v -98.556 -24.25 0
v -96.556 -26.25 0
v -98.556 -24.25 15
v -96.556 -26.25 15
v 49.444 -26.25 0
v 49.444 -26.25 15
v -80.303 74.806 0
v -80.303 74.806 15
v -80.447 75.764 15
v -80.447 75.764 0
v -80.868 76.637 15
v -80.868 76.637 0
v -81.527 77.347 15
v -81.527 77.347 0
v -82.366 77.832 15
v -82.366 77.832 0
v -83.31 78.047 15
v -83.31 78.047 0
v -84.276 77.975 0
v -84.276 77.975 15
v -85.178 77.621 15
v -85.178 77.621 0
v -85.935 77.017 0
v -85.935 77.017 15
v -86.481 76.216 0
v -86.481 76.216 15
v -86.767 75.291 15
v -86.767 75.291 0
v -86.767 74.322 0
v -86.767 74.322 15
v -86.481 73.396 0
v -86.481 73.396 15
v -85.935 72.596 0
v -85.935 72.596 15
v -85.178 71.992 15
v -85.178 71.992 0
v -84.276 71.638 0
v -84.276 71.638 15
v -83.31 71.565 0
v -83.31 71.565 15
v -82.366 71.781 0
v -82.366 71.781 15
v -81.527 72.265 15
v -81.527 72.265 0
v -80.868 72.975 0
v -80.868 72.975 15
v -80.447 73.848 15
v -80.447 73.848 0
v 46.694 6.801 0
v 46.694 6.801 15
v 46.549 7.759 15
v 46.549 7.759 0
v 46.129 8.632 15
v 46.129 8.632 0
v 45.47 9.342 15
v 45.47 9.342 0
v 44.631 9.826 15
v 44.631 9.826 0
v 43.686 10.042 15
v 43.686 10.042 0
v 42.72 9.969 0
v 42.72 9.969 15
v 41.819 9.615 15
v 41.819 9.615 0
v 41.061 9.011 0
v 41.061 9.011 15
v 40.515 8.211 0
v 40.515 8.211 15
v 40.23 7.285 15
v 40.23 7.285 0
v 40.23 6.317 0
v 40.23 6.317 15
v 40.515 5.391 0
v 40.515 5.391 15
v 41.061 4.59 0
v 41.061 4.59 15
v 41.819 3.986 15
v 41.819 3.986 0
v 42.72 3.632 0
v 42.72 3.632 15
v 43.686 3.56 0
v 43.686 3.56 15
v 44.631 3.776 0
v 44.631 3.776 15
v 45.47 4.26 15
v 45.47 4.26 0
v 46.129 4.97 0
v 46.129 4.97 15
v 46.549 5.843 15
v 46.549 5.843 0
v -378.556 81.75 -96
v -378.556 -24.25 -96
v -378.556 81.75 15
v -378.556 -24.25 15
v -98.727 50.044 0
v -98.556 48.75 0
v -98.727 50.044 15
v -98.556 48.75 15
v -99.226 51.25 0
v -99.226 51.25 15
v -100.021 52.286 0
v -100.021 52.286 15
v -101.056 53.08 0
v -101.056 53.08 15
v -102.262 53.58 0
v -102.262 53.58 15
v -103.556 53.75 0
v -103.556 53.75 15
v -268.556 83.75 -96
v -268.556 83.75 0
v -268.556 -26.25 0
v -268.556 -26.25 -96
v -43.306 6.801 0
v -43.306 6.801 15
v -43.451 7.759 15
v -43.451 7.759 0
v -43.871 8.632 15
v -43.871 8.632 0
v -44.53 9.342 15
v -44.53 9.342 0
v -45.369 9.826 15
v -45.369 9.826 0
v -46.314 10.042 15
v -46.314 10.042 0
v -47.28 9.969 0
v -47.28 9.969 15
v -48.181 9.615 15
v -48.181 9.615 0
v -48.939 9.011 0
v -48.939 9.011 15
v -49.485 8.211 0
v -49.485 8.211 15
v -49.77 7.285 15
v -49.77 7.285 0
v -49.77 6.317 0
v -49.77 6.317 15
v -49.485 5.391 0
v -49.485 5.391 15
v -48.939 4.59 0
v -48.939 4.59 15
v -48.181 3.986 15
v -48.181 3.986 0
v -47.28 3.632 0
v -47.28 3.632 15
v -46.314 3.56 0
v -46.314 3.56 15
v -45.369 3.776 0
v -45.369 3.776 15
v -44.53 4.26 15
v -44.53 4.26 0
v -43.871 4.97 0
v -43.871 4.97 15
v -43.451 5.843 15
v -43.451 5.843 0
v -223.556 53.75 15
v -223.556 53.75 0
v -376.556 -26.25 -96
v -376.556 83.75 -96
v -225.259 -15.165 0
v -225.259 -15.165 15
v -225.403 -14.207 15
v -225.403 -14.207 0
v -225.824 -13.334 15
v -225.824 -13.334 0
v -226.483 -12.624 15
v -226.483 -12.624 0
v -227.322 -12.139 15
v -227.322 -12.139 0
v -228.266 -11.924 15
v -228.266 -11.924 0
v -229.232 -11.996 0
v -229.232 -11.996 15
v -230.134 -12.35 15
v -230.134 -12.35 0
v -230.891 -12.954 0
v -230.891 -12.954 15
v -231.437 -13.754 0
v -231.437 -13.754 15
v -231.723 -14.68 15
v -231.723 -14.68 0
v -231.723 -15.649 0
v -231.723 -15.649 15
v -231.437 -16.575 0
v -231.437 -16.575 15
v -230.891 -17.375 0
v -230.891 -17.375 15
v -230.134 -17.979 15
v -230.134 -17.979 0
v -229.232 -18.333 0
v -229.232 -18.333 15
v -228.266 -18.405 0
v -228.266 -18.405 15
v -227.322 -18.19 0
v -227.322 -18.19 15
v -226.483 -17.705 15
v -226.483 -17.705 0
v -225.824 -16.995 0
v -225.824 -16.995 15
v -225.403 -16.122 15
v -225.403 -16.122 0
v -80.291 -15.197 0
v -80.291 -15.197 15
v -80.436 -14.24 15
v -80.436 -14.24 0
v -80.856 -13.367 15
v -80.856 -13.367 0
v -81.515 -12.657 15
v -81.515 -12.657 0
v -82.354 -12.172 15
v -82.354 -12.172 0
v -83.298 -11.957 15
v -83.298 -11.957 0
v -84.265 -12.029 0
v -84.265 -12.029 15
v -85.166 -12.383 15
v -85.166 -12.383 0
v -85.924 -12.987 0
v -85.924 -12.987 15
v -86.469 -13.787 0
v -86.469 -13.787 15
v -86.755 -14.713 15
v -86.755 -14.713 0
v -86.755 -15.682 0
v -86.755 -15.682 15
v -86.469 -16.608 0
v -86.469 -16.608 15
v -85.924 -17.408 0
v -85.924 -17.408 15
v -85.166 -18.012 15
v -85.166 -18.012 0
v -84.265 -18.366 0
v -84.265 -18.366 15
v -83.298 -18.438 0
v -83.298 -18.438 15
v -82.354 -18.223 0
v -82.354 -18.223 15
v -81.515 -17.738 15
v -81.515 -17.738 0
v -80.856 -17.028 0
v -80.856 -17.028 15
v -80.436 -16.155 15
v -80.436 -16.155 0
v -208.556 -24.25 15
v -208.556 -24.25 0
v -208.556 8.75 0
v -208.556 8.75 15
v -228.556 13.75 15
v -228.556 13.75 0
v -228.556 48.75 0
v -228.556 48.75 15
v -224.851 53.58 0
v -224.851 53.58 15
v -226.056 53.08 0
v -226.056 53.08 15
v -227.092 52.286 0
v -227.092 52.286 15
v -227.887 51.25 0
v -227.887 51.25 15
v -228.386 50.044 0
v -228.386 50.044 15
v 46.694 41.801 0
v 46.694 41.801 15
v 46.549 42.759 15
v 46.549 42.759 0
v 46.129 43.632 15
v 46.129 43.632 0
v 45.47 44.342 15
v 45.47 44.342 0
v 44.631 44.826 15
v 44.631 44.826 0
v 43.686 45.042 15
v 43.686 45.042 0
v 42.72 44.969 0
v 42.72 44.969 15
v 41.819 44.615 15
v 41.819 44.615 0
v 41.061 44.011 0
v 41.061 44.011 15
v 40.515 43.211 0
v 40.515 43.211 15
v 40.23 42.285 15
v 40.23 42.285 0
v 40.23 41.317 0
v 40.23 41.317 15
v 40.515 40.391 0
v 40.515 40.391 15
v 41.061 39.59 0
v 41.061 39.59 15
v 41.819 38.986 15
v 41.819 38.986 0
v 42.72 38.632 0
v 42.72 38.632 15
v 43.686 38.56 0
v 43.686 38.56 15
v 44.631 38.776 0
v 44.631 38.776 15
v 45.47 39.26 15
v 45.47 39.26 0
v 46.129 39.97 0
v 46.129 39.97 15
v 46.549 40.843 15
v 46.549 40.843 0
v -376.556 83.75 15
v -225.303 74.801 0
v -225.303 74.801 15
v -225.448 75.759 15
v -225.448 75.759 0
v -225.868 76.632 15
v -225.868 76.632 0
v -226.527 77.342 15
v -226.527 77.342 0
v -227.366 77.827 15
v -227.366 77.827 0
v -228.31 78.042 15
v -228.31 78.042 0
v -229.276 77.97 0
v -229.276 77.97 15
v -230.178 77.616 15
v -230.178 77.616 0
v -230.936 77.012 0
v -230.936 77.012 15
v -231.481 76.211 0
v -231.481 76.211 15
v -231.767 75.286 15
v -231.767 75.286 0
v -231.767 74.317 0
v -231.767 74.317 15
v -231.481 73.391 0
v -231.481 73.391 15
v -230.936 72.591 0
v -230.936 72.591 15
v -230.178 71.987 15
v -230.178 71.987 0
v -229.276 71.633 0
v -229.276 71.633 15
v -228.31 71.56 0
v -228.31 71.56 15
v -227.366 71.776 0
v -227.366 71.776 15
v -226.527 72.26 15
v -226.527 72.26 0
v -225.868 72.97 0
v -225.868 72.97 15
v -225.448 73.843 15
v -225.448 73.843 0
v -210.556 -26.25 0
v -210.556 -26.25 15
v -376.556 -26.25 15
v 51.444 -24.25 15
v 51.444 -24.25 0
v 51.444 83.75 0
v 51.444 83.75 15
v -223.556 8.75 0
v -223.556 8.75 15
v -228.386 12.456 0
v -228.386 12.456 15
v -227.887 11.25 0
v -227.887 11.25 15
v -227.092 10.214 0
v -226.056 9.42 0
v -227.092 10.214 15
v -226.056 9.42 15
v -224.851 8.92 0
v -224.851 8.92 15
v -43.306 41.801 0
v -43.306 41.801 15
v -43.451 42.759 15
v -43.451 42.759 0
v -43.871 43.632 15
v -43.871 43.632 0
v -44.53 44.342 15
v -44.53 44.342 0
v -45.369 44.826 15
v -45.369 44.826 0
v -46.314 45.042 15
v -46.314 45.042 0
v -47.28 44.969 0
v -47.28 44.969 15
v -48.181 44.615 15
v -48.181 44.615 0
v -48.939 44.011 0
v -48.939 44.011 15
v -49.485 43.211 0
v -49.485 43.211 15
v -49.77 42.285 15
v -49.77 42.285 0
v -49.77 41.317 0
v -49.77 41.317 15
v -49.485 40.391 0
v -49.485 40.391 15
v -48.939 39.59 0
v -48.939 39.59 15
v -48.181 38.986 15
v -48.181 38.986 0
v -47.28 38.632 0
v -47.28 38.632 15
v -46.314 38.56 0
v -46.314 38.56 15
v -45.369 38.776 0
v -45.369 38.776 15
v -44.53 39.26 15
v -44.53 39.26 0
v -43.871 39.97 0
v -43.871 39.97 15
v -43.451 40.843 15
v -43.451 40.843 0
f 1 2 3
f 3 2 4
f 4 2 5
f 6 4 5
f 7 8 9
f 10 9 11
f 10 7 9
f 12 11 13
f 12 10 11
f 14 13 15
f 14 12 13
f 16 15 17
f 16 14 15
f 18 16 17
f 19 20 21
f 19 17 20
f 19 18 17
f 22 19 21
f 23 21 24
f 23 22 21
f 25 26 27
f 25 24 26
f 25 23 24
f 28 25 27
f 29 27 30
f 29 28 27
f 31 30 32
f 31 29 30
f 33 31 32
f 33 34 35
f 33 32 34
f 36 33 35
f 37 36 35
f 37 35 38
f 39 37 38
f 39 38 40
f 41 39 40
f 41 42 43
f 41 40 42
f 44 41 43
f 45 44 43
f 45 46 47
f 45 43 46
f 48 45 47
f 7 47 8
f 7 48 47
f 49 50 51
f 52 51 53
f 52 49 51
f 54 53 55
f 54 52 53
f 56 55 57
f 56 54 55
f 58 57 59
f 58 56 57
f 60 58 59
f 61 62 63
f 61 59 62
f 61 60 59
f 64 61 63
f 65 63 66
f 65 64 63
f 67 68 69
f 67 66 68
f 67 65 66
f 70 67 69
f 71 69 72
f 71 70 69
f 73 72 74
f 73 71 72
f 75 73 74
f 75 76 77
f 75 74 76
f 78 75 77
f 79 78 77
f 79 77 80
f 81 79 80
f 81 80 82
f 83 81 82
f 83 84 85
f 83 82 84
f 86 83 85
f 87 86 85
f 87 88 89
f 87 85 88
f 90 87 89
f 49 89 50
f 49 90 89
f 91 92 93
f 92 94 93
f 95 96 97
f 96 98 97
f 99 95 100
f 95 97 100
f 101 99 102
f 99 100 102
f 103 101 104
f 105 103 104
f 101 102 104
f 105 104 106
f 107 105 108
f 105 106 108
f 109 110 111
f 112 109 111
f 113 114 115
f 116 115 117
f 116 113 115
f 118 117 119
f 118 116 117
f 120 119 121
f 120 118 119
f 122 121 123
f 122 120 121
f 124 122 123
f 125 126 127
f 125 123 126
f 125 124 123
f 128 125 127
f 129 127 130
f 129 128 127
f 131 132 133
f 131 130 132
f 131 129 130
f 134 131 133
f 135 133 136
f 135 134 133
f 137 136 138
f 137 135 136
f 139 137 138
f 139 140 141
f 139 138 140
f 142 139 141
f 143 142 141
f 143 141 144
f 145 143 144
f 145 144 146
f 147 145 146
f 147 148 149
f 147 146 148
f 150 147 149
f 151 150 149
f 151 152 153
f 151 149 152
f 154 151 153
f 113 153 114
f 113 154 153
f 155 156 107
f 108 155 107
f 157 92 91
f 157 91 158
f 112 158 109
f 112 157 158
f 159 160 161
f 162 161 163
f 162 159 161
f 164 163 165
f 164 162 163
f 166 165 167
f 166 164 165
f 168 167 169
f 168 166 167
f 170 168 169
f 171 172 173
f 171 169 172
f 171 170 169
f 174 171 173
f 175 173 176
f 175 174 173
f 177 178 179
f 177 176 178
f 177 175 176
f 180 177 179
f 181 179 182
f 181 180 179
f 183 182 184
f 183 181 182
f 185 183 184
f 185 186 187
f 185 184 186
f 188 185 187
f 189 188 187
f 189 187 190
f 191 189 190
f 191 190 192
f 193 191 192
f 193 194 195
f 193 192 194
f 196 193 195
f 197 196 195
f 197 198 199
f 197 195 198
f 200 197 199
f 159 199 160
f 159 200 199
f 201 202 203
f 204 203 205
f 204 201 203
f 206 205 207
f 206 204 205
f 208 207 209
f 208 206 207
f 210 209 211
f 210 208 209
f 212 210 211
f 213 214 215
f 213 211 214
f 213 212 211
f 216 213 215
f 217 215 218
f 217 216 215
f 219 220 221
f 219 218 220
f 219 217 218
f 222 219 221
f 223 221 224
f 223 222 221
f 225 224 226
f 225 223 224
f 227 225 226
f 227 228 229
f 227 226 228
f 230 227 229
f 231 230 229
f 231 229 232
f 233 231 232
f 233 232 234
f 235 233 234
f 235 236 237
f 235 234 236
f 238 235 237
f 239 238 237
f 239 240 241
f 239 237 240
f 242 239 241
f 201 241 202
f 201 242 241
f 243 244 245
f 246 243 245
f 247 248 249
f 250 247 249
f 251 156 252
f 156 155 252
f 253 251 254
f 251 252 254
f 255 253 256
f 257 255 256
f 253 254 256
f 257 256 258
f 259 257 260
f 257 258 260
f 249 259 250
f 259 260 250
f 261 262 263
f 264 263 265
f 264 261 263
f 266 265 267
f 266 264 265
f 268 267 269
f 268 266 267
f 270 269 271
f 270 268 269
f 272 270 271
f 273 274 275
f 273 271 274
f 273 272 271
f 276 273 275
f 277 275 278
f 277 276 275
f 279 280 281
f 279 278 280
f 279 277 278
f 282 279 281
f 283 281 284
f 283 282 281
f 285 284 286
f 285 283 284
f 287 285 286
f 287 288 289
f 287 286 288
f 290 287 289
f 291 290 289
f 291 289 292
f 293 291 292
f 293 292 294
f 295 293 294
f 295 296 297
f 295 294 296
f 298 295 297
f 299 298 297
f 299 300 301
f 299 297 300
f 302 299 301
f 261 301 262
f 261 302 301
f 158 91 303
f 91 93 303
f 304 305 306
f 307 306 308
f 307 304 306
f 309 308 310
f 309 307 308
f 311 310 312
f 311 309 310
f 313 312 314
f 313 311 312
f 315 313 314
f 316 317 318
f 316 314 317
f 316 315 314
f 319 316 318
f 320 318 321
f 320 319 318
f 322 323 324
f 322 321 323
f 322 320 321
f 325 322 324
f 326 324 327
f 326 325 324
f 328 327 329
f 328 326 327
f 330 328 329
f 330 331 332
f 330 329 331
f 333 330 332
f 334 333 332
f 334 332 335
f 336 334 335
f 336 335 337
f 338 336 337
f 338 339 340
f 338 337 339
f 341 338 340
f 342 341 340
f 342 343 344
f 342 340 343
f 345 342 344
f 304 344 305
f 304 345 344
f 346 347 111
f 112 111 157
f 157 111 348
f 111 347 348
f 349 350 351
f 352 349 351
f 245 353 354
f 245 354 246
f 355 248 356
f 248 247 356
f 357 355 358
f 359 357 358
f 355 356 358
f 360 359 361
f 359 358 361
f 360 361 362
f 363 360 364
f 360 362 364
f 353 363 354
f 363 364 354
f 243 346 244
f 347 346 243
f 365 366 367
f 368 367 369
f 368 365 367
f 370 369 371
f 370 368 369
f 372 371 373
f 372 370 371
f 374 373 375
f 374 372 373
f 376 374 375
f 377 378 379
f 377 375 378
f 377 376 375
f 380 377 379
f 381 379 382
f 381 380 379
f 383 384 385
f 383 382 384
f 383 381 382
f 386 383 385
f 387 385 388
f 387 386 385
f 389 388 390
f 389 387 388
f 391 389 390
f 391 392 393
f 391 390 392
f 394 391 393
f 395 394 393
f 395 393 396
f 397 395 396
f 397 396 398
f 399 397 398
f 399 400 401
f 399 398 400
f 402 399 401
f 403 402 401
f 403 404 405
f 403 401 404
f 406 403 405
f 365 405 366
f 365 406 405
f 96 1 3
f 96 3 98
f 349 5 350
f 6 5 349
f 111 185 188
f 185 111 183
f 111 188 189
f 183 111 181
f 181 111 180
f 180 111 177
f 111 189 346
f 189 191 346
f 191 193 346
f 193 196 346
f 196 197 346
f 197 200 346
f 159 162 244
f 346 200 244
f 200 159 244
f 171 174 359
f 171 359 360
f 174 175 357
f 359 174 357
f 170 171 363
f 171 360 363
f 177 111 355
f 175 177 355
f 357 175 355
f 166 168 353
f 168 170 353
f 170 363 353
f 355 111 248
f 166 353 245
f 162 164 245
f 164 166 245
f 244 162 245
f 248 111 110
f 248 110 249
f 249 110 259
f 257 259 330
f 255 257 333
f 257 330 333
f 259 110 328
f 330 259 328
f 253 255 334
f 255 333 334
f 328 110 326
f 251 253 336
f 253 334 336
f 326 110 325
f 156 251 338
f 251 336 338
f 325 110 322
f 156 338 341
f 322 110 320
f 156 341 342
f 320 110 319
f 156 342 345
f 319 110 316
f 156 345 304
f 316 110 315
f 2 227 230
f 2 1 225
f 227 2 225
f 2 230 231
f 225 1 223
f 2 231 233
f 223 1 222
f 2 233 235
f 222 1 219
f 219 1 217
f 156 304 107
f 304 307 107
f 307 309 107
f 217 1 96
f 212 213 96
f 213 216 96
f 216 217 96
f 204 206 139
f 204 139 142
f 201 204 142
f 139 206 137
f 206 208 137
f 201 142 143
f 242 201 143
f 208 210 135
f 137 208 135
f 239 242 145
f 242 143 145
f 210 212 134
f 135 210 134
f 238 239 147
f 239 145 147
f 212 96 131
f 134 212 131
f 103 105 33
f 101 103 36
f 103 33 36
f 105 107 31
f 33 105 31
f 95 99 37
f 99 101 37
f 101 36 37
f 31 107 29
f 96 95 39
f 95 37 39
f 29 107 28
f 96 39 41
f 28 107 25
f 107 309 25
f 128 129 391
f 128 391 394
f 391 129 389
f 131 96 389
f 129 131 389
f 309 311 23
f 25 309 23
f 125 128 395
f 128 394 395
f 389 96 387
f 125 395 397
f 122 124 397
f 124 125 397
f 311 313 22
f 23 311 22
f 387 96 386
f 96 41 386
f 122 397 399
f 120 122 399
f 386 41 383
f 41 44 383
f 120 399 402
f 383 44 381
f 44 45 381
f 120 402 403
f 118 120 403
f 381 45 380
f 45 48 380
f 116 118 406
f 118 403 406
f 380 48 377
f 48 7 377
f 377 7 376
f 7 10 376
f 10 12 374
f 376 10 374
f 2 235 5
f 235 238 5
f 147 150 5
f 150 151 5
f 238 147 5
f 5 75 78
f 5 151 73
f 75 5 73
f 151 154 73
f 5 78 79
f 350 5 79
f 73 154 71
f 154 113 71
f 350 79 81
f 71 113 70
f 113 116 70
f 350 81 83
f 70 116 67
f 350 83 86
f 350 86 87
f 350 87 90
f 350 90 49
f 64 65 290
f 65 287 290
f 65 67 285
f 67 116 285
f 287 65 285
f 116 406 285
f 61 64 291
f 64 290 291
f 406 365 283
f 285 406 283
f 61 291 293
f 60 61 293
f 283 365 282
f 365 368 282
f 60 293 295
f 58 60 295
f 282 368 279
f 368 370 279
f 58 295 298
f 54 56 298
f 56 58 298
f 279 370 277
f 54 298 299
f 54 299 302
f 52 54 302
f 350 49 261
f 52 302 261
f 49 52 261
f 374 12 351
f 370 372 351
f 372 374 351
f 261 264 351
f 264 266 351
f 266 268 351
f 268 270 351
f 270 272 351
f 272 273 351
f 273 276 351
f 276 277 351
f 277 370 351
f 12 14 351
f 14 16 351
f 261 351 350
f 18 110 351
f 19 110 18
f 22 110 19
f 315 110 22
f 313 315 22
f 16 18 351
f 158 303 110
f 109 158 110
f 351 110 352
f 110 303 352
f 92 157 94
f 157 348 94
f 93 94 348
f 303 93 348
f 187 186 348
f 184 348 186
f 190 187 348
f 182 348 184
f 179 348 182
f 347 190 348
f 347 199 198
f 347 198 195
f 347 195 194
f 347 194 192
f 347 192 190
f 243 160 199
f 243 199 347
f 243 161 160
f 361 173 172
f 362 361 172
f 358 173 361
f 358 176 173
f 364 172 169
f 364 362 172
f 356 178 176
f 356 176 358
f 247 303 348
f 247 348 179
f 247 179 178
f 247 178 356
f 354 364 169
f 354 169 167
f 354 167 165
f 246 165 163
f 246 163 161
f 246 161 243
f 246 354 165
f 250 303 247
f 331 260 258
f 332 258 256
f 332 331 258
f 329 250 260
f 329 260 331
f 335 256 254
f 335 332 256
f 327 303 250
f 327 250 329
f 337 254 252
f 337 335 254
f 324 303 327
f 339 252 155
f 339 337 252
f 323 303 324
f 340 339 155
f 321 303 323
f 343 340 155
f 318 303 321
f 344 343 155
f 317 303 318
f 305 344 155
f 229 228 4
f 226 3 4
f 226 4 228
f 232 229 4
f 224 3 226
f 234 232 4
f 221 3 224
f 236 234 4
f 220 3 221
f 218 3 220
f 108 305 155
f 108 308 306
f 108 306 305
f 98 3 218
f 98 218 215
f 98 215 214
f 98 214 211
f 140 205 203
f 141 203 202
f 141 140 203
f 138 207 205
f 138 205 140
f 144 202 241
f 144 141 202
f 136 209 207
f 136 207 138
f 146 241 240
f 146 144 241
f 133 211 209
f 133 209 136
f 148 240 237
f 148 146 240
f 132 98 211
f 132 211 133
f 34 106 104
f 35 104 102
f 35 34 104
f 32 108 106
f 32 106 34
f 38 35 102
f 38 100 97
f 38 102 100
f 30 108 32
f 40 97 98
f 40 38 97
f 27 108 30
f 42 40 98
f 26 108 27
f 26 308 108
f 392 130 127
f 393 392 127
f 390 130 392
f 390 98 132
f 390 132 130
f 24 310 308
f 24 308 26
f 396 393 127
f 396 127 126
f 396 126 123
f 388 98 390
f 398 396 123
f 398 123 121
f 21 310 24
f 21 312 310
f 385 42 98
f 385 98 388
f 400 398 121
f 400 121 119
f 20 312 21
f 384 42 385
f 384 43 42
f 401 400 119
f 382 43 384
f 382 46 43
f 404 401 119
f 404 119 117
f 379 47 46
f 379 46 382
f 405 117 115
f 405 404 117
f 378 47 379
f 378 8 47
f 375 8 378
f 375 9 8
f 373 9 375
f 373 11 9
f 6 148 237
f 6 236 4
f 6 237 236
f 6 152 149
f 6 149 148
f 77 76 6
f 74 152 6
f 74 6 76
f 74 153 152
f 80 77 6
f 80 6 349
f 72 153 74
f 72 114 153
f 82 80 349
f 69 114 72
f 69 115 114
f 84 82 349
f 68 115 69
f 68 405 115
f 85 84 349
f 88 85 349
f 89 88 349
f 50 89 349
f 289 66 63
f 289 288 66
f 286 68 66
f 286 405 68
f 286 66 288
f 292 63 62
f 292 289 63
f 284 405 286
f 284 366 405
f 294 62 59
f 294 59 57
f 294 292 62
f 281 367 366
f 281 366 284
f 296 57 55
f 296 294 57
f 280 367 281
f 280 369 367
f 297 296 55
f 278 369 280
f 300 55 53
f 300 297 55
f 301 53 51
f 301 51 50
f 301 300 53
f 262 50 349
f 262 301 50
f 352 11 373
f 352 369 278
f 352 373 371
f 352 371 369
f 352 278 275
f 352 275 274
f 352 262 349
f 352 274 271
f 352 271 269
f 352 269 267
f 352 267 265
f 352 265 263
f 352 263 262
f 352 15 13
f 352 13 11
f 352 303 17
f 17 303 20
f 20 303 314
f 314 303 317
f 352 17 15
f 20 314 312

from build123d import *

# Parameters (mm, degrees)
F0_W      = 430
F0_H      = 110
F1_DEPTH  = 15
F2_W      = 130
F2_H      = 45
F3_DEPTH  = 25
F4_W      = 110
F4_H      = 45.9024896845
F5_DEPTH  = 25
F6_R      = 5
F7_SIZE   = 2
F9_DEPTH  = 96
F11_R     = 3.25
F12_DEPTH = 25
F13_R     = 3.25
F14_DEPTH = 25


with BuildPart() as f1:
    # F0 (on Top) → F1 (new body)
    with BuildSketch(Plane.XY):
        with Locations((-163.5564976931, 28.7499989569)):
            Rectangle(F0_W, F0_H)
    extrude(amount=F1_DEPTH)

    # F2 (on Top) → F3 (cut)
    with BuildSketch(Plane.XY):
        with Locations((-163.5564976931, 31.2499989569)):
            Rectangle(F2_W, F2_H)
    extrude(amount=F3_DEPTH, mode=Mode.SUBTRACT)

    # F4 (on Top) → F5 (cut)
    with BuildSketch(Plane.XY):
        with Locations((-153.5564976931, -10.6971156783)):
            Rectangle(F4_W, F4_H)
    extrude(amount=F5_DEPTH, mode=Mode.SUBTRACT)

    # F6
    f6_edges = [f1.edges().sort_by_distance(p)[0] for p in [
        (-228.556498, 53.749999, 7.5),
        (-98.556498, 53.749999, 7.5),
        (-228.556498, 8.749999, 7.5),
    ]]
    fillet(f6_edges, radius=F6_R)

    # F7
    f7_edges = [f1.edges().sort_by_distance(p)[0] for p in [
        (-208.556498, -26.250001, 7.5),
        (-98.556498, -26.250001, 7.5),
        (-378.556498, -26.250001, 7.5),
        (-378.556498, 83.749999, 7.5),
        (51.443502, -26.250001, 7.5),
    ]]
    chamfer(f7_edges, length=F7_SIZE)

    # F8 (on face) → F9 (join)
    with BuildSketch(Plane(origin=(0, 0, 0), x_dir=(1, 0, 0), z_dir=(0, 0, -1))):
        Polygon((-268.5564976931, 26.2500010431), (-376.5564976931, 26.2500010431), (-378.5564976931, 24.2500010431), (-378.5564976931, -81.7499989569), (-376.5564976931, -83.7499989569), (-268.5564976931, -83.7499989569), align=None)
    extrude(amount=F9_DEPTH)

    # F11 (on Top) → F12 (cut)
    with BuildSketch(Plane.XY):
        with Locations((-228.5088598728, -15.1645448059)):
            Circle(F11_R)
        with Locations((-228.553250432, 74.8012885451)):
            Circle(F11_R)
        with Locations((-83.5528895259, 74.8062729836)):
            Circle(F11_R)
        with Locations((-83.5413336754, -15.1974624023)):
            Circle(F11_R)
    extrude(amount=F12_DEPTH, mode=Mode.SUBTRACT)

    # F13 (on Top) → F14 (cut)
    with BuildSketch(Plane.XY):
        with Locations((-46.5564976931, 6.8009085655)):
            Circle(F13_R)
        with Locations((-46.5564976931, 41.8009085655)):
            Circle(F13_R)
        with Locations((43.4435023069, 6.8009085655)):
            Circle(F13_R)
        with Locations((43.4435023069, 41.8009085655)):
            Circle(F13_R)
    extrude(amount=F14_DEPTH, mode=Mode.SUBTRACT)


solid = f1.part
